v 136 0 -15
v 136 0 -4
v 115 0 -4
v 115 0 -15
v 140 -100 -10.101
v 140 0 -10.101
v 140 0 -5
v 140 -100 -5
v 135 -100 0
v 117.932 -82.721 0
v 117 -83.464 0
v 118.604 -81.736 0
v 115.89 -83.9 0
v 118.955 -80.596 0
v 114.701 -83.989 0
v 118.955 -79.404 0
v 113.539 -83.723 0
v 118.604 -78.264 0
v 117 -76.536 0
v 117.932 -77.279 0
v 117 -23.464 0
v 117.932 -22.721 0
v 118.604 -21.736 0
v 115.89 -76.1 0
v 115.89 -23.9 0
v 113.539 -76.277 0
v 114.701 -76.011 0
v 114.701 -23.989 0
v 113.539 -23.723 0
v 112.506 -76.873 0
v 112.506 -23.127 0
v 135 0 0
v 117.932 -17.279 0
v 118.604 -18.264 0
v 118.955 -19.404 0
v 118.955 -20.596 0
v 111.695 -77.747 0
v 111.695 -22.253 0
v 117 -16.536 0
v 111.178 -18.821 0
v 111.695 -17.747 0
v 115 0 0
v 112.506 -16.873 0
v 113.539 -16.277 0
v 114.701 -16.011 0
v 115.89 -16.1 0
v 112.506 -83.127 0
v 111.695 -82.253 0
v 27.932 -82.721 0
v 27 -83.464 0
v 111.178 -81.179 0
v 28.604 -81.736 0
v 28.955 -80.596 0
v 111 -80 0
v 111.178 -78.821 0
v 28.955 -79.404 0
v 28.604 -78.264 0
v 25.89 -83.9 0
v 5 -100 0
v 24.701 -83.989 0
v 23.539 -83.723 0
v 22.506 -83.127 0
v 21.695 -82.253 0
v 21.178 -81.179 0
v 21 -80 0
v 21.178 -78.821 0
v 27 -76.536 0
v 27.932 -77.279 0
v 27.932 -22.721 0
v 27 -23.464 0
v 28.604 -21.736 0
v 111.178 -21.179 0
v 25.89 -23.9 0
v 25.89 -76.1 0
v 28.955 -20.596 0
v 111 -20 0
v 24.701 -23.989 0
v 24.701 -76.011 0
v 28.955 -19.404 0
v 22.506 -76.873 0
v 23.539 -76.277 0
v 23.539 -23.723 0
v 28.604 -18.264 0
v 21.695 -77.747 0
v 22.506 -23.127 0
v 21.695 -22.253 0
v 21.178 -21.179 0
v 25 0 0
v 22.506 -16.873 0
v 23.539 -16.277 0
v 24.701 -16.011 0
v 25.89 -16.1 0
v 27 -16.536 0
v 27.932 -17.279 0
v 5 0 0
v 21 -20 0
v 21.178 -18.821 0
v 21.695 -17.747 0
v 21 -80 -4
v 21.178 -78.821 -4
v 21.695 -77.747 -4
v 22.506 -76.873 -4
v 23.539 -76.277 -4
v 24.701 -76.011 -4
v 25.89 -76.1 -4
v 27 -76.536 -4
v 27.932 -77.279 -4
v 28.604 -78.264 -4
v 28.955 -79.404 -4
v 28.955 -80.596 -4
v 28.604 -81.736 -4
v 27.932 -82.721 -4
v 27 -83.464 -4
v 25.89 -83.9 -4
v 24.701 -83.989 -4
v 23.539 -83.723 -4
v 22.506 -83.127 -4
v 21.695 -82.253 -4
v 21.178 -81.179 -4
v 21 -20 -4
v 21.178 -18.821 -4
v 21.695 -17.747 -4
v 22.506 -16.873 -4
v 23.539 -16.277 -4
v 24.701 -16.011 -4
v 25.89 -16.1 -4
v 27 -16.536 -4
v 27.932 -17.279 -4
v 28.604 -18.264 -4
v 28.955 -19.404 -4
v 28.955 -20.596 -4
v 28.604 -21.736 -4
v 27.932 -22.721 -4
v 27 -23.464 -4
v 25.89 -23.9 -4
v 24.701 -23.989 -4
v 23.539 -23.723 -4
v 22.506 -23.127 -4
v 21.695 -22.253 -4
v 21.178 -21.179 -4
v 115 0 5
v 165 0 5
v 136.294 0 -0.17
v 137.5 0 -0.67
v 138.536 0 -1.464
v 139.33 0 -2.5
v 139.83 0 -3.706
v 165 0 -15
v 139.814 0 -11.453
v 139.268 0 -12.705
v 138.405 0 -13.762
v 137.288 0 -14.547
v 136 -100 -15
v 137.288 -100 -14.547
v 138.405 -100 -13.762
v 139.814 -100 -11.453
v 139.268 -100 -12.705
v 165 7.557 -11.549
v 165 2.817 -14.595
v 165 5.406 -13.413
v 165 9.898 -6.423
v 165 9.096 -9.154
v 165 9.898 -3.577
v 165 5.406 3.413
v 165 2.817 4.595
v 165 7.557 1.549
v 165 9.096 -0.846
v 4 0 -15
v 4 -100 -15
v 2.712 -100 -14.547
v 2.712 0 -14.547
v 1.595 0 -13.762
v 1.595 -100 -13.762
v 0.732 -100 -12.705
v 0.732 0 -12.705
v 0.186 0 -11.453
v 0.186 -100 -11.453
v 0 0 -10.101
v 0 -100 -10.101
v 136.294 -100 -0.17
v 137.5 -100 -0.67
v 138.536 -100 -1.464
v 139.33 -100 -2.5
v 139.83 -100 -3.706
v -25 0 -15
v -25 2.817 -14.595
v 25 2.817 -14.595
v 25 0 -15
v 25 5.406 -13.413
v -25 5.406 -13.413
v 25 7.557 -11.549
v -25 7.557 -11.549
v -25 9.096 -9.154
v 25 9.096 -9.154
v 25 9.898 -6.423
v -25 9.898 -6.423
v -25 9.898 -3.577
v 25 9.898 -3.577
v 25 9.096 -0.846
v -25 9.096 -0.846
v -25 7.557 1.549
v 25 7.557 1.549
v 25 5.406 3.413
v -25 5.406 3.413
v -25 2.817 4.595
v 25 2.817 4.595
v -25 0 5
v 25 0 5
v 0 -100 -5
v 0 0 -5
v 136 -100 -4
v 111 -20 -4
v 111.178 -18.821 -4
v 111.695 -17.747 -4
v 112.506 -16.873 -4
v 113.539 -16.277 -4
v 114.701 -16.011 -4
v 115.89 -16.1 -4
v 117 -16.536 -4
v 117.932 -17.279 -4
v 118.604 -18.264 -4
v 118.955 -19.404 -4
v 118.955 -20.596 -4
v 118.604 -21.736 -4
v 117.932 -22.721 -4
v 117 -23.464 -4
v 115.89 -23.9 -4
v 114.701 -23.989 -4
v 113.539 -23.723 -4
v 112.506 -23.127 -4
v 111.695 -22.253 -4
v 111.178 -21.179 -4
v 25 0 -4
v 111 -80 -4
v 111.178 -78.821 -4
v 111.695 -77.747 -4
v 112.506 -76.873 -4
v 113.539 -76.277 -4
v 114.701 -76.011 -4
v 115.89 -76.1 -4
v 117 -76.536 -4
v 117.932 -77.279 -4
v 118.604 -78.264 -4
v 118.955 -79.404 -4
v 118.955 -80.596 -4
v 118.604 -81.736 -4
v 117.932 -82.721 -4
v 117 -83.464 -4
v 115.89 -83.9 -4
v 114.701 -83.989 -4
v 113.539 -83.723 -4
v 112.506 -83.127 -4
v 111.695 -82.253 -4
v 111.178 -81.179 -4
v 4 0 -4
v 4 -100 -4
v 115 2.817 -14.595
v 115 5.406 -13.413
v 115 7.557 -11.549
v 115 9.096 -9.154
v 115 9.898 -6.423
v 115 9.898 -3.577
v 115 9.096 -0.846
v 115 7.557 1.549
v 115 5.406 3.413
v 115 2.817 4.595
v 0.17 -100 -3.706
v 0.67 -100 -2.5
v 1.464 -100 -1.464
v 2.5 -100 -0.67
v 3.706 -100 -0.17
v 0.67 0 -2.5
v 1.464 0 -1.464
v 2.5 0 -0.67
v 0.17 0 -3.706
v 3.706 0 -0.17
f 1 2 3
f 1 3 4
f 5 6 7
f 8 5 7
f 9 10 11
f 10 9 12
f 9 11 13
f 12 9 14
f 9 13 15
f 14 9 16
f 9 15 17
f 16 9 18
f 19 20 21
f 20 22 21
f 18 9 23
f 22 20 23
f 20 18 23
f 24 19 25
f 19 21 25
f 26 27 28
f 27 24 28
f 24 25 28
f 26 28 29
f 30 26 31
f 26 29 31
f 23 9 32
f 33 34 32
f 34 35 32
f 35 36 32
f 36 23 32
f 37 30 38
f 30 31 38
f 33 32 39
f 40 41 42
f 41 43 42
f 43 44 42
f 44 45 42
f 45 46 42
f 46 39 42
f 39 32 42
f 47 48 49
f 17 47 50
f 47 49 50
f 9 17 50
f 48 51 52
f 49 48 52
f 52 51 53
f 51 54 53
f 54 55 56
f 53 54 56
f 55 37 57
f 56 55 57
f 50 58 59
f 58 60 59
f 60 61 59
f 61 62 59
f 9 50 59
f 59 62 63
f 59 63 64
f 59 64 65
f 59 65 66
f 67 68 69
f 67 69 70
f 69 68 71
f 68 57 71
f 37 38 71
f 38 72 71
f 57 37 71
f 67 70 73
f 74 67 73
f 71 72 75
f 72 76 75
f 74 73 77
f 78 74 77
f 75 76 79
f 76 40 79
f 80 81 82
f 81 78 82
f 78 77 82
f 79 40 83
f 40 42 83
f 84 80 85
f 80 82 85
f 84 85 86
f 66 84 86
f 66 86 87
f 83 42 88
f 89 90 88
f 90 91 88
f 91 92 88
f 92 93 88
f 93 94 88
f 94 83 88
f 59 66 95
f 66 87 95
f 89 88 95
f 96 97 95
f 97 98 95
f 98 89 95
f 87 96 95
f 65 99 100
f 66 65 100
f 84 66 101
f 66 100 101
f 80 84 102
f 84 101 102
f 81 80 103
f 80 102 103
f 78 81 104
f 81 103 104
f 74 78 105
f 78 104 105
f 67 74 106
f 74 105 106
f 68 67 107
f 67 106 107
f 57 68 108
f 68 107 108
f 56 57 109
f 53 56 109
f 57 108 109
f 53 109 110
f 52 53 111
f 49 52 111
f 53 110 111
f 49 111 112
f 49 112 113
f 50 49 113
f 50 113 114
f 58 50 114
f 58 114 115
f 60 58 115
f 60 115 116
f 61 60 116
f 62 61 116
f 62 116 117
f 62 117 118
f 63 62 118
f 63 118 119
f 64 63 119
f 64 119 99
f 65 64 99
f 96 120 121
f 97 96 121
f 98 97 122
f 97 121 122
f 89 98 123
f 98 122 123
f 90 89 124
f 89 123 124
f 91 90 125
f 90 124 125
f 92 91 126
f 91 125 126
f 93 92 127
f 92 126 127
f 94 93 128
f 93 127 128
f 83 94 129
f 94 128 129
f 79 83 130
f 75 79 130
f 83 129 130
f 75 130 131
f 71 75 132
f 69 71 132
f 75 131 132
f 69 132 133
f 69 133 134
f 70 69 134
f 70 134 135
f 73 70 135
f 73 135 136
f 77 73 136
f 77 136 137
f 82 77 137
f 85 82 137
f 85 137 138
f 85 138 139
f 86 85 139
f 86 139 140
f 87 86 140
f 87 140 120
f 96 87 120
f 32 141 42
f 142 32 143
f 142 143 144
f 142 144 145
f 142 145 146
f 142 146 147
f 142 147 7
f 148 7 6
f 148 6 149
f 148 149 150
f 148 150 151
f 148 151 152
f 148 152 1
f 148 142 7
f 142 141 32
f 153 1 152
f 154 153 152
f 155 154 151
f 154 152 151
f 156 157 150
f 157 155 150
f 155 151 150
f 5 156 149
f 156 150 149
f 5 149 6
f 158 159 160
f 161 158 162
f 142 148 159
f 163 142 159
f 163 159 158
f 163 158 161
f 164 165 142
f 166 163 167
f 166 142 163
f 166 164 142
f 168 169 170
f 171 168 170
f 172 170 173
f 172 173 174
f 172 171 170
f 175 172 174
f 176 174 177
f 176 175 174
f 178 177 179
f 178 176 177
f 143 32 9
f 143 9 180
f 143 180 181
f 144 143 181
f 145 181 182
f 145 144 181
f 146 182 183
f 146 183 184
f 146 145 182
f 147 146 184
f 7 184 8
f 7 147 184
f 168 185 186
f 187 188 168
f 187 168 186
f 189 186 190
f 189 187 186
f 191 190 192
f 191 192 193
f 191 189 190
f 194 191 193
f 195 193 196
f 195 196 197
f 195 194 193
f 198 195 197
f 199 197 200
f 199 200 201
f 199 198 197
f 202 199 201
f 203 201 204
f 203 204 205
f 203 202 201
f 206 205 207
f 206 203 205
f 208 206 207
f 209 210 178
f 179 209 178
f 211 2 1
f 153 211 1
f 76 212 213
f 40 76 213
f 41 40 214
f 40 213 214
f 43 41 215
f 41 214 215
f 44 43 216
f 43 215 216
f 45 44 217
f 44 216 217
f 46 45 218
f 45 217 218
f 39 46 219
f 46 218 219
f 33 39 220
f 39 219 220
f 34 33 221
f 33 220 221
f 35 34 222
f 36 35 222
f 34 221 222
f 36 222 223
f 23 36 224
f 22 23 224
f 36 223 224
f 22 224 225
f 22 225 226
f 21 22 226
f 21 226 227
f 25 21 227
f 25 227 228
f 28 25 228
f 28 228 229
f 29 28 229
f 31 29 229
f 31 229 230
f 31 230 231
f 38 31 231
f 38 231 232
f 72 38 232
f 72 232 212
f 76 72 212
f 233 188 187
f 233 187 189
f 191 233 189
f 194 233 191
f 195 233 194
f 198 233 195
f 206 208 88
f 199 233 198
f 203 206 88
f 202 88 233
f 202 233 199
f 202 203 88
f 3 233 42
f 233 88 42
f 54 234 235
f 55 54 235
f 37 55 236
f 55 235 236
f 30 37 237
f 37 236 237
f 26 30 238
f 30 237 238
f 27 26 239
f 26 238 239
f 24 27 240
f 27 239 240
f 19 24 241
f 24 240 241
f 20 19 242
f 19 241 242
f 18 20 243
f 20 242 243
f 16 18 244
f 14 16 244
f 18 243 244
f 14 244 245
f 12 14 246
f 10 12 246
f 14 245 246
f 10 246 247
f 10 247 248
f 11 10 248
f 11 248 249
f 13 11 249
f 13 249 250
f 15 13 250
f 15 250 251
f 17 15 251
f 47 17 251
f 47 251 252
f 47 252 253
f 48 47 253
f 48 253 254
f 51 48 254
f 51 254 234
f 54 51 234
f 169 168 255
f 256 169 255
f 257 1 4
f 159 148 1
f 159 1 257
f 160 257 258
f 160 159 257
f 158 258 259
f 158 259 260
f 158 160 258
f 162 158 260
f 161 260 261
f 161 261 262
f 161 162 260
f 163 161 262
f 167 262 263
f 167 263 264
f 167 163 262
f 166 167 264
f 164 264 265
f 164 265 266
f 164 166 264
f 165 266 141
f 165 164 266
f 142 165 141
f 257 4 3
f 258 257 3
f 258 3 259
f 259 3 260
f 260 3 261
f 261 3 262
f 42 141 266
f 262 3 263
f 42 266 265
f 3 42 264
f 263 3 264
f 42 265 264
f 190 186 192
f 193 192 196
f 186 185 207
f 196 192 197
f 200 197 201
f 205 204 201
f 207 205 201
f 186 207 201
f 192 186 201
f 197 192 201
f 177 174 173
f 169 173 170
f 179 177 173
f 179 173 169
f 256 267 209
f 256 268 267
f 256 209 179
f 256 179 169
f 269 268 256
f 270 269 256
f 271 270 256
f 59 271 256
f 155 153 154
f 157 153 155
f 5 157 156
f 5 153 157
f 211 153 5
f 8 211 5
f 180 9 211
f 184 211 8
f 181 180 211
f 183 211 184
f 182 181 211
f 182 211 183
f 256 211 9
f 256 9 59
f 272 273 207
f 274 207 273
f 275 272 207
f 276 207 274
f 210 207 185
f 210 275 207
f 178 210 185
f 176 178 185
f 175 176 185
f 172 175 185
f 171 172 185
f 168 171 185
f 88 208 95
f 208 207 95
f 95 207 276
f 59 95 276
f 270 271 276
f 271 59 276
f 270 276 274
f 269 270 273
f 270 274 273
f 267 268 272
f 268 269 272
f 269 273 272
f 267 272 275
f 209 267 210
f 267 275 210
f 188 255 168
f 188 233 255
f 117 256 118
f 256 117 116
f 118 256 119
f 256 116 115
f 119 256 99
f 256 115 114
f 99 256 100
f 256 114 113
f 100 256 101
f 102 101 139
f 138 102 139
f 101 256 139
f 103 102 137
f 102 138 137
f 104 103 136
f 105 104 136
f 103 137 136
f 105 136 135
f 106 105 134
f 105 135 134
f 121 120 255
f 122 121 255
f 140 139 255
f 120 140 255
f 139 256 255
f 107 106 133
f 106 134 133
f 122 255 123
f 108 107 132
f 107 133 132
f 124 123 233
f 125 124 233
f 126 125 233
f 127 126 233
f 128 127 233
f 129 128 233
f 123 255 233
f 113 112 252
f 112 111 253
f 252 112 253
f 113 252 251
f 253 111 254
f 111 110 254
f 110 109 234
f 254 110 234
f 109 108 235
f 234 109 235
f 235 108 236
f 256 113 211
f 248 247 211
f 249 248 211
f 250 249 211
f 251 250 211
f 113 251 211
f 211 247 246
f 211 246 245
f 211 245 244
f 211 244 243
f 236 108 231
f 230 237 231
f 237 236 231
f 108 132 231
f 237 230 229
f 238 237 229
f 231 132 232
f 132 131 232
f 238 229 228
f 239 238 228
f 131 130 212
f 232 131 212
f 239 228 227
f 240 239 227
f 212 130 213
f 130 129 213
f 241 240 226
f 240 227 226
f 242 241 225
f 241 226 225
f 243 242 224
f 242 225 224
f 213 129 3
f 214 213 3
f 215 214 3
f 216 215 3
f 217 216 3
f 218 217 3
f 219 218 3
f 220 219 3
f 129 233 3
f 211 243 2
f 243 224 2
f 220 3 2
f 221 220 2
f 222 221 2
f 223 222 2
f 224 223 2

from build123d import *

# Parameters (mm, degrees)
F1_DEPTH    = 100
F2_T1_DEPTH = 125
F2_T3_DEPTH = 124.4948974279
F3_T1_DEPTH = 124.4948974279
F3_T3_DEPTH = 125
F5_D        = 8
F7_R        = 7.5
F10_DEPTH   = 25
F14_DEPTH   = 25


# Not quite as in the source:
# - a fillet or chamfer that OpenCascade refuses, or shapes differently, is made with other operations: its cross-section is extruded or revolved along the edge and cut away or added


with BuildPart() as f1:
    # F0 (on Front) → F1 (new body)
    with BuildSketch(Plane.XZ):
        Polygon((140, 0), (0, 0), (0, -15), (4, -15), (4, -4), (136, -4), (136, -15), (140, -15), align=None)
    extrude(amount=F1_DEPTH)

    # F2: fillet of radius 5 on 2 edges, made by hand

    # F2_s2 → F2_t1 (cut)
    with BuildSketch(Plane.XZ.offset(-12.5)):
        with BuildLine():
            ThreePointArc((5, 0), (1.4644660941, -1.4644660941), (0, -5))
            Line((0, -5), (0, 0))
            Line((0, 0), (5, 0))
        make_face()
    extrude(amount=F2_T1_DEPTH, mode=Mode.SUBTRACT)

    # F2_s4 → F2_t3 (cut)
    with BuildSketch(Plane.XZ.offset(-12.2474487139)):
        with BuildLine():
            ThreePointArc((136, -15), (138.8729833462, -13.2632981746), (140, -10.1010205144))
            Line((140, -10.1010205144), (140, -15))
            Line((140, -15), (136, -15))
        make_face()
    extrude(amount=F2_T3_DEPTH, mode=Mode.SUBTRACT)

    # F3: fillet of radius 5 on 2 edges, made by hand

    # F3_s2 → F3_t1 (cut)
    with BuildSketch(Plane.XZ.offset(-12.2474487139)):
        with BuildLine():
            ThreePointArc((4, -15), (1.1270166538, -13.2632981746), (0, -10.1010205144))
            Line((0, -10.1010205144), (0, -15))
            Line((0, -15), (4, -15))
        make_face()
    extrude(amount=F3_T1_DEPTH, mode=Mode.SUBTRACT)

    # F3_s4 → F3_t3 (cut)
    with BuildSketch(Plane.XZ.offset(-12.5)):
        with BuildLine():
            ThreePointArc((135, 0), (138.5355339059, -1.4644660941), (140, -5))
            Line((140, -5), (140, 0))
            Line((140, 0), (135, 0))
        make_face()
    extrude(amount=F3_T3_DEPTH, mode=Mode.SUBTRACT)

    # F5 (through all)
    with Locations(Plane.XY):
        with Locations((25, -20), (115, -20), (25, -80), (115, -80)):
            Hole(F5_D / 2)

    # F9 (on Right) → F10 (join, symmetric)
    with BuildSketch(Plane.YZ):
        with BuildLine():
            Line((0, 5), (0, 0))
            Line((0, 0), (0, -5))
            Line((0, -5), (0, -15))
            ThreePointArc((0, -15), (10, -5), (0, 5))
        make_face()
    extrude(amount=F10_DEPTH, both=True)

    # F13 (on offset) → F14 (join, symmetric)
    with BuildSketch(Plane.YZ.offset(140)):
        with BuildLine():
            Line((0, -10.1010205144), (0, -15))
            ThreePointArc((0, -15), (10, -5), (0, 5))
            Line((0, 5), (0, 0))
            Line((0, 0), (0, -5))
            Line((0, -5), (0, -10.1010205144))
        make_face()
    extrude(amount=F14_DEPTH, both=True)


with BuildPart() as f8:
    # F8: sweep along a path in F6
    with BuildLine(Plane.XZ) as f8_path:
        Line((-40, 0), (-40, 100))
        ThreePointArc((-40, 100), (-85, 150), (-130, 100))
        Line((-130, 100), (-130, 0))
    # F7 (on Top) → F8 (sweep)
    with BuildSketch(Plane.XY):
        with Locations((-40, 0)):
            Circle(F7_R)
    sweep(path=f8_path.line)


solid = f1.part
